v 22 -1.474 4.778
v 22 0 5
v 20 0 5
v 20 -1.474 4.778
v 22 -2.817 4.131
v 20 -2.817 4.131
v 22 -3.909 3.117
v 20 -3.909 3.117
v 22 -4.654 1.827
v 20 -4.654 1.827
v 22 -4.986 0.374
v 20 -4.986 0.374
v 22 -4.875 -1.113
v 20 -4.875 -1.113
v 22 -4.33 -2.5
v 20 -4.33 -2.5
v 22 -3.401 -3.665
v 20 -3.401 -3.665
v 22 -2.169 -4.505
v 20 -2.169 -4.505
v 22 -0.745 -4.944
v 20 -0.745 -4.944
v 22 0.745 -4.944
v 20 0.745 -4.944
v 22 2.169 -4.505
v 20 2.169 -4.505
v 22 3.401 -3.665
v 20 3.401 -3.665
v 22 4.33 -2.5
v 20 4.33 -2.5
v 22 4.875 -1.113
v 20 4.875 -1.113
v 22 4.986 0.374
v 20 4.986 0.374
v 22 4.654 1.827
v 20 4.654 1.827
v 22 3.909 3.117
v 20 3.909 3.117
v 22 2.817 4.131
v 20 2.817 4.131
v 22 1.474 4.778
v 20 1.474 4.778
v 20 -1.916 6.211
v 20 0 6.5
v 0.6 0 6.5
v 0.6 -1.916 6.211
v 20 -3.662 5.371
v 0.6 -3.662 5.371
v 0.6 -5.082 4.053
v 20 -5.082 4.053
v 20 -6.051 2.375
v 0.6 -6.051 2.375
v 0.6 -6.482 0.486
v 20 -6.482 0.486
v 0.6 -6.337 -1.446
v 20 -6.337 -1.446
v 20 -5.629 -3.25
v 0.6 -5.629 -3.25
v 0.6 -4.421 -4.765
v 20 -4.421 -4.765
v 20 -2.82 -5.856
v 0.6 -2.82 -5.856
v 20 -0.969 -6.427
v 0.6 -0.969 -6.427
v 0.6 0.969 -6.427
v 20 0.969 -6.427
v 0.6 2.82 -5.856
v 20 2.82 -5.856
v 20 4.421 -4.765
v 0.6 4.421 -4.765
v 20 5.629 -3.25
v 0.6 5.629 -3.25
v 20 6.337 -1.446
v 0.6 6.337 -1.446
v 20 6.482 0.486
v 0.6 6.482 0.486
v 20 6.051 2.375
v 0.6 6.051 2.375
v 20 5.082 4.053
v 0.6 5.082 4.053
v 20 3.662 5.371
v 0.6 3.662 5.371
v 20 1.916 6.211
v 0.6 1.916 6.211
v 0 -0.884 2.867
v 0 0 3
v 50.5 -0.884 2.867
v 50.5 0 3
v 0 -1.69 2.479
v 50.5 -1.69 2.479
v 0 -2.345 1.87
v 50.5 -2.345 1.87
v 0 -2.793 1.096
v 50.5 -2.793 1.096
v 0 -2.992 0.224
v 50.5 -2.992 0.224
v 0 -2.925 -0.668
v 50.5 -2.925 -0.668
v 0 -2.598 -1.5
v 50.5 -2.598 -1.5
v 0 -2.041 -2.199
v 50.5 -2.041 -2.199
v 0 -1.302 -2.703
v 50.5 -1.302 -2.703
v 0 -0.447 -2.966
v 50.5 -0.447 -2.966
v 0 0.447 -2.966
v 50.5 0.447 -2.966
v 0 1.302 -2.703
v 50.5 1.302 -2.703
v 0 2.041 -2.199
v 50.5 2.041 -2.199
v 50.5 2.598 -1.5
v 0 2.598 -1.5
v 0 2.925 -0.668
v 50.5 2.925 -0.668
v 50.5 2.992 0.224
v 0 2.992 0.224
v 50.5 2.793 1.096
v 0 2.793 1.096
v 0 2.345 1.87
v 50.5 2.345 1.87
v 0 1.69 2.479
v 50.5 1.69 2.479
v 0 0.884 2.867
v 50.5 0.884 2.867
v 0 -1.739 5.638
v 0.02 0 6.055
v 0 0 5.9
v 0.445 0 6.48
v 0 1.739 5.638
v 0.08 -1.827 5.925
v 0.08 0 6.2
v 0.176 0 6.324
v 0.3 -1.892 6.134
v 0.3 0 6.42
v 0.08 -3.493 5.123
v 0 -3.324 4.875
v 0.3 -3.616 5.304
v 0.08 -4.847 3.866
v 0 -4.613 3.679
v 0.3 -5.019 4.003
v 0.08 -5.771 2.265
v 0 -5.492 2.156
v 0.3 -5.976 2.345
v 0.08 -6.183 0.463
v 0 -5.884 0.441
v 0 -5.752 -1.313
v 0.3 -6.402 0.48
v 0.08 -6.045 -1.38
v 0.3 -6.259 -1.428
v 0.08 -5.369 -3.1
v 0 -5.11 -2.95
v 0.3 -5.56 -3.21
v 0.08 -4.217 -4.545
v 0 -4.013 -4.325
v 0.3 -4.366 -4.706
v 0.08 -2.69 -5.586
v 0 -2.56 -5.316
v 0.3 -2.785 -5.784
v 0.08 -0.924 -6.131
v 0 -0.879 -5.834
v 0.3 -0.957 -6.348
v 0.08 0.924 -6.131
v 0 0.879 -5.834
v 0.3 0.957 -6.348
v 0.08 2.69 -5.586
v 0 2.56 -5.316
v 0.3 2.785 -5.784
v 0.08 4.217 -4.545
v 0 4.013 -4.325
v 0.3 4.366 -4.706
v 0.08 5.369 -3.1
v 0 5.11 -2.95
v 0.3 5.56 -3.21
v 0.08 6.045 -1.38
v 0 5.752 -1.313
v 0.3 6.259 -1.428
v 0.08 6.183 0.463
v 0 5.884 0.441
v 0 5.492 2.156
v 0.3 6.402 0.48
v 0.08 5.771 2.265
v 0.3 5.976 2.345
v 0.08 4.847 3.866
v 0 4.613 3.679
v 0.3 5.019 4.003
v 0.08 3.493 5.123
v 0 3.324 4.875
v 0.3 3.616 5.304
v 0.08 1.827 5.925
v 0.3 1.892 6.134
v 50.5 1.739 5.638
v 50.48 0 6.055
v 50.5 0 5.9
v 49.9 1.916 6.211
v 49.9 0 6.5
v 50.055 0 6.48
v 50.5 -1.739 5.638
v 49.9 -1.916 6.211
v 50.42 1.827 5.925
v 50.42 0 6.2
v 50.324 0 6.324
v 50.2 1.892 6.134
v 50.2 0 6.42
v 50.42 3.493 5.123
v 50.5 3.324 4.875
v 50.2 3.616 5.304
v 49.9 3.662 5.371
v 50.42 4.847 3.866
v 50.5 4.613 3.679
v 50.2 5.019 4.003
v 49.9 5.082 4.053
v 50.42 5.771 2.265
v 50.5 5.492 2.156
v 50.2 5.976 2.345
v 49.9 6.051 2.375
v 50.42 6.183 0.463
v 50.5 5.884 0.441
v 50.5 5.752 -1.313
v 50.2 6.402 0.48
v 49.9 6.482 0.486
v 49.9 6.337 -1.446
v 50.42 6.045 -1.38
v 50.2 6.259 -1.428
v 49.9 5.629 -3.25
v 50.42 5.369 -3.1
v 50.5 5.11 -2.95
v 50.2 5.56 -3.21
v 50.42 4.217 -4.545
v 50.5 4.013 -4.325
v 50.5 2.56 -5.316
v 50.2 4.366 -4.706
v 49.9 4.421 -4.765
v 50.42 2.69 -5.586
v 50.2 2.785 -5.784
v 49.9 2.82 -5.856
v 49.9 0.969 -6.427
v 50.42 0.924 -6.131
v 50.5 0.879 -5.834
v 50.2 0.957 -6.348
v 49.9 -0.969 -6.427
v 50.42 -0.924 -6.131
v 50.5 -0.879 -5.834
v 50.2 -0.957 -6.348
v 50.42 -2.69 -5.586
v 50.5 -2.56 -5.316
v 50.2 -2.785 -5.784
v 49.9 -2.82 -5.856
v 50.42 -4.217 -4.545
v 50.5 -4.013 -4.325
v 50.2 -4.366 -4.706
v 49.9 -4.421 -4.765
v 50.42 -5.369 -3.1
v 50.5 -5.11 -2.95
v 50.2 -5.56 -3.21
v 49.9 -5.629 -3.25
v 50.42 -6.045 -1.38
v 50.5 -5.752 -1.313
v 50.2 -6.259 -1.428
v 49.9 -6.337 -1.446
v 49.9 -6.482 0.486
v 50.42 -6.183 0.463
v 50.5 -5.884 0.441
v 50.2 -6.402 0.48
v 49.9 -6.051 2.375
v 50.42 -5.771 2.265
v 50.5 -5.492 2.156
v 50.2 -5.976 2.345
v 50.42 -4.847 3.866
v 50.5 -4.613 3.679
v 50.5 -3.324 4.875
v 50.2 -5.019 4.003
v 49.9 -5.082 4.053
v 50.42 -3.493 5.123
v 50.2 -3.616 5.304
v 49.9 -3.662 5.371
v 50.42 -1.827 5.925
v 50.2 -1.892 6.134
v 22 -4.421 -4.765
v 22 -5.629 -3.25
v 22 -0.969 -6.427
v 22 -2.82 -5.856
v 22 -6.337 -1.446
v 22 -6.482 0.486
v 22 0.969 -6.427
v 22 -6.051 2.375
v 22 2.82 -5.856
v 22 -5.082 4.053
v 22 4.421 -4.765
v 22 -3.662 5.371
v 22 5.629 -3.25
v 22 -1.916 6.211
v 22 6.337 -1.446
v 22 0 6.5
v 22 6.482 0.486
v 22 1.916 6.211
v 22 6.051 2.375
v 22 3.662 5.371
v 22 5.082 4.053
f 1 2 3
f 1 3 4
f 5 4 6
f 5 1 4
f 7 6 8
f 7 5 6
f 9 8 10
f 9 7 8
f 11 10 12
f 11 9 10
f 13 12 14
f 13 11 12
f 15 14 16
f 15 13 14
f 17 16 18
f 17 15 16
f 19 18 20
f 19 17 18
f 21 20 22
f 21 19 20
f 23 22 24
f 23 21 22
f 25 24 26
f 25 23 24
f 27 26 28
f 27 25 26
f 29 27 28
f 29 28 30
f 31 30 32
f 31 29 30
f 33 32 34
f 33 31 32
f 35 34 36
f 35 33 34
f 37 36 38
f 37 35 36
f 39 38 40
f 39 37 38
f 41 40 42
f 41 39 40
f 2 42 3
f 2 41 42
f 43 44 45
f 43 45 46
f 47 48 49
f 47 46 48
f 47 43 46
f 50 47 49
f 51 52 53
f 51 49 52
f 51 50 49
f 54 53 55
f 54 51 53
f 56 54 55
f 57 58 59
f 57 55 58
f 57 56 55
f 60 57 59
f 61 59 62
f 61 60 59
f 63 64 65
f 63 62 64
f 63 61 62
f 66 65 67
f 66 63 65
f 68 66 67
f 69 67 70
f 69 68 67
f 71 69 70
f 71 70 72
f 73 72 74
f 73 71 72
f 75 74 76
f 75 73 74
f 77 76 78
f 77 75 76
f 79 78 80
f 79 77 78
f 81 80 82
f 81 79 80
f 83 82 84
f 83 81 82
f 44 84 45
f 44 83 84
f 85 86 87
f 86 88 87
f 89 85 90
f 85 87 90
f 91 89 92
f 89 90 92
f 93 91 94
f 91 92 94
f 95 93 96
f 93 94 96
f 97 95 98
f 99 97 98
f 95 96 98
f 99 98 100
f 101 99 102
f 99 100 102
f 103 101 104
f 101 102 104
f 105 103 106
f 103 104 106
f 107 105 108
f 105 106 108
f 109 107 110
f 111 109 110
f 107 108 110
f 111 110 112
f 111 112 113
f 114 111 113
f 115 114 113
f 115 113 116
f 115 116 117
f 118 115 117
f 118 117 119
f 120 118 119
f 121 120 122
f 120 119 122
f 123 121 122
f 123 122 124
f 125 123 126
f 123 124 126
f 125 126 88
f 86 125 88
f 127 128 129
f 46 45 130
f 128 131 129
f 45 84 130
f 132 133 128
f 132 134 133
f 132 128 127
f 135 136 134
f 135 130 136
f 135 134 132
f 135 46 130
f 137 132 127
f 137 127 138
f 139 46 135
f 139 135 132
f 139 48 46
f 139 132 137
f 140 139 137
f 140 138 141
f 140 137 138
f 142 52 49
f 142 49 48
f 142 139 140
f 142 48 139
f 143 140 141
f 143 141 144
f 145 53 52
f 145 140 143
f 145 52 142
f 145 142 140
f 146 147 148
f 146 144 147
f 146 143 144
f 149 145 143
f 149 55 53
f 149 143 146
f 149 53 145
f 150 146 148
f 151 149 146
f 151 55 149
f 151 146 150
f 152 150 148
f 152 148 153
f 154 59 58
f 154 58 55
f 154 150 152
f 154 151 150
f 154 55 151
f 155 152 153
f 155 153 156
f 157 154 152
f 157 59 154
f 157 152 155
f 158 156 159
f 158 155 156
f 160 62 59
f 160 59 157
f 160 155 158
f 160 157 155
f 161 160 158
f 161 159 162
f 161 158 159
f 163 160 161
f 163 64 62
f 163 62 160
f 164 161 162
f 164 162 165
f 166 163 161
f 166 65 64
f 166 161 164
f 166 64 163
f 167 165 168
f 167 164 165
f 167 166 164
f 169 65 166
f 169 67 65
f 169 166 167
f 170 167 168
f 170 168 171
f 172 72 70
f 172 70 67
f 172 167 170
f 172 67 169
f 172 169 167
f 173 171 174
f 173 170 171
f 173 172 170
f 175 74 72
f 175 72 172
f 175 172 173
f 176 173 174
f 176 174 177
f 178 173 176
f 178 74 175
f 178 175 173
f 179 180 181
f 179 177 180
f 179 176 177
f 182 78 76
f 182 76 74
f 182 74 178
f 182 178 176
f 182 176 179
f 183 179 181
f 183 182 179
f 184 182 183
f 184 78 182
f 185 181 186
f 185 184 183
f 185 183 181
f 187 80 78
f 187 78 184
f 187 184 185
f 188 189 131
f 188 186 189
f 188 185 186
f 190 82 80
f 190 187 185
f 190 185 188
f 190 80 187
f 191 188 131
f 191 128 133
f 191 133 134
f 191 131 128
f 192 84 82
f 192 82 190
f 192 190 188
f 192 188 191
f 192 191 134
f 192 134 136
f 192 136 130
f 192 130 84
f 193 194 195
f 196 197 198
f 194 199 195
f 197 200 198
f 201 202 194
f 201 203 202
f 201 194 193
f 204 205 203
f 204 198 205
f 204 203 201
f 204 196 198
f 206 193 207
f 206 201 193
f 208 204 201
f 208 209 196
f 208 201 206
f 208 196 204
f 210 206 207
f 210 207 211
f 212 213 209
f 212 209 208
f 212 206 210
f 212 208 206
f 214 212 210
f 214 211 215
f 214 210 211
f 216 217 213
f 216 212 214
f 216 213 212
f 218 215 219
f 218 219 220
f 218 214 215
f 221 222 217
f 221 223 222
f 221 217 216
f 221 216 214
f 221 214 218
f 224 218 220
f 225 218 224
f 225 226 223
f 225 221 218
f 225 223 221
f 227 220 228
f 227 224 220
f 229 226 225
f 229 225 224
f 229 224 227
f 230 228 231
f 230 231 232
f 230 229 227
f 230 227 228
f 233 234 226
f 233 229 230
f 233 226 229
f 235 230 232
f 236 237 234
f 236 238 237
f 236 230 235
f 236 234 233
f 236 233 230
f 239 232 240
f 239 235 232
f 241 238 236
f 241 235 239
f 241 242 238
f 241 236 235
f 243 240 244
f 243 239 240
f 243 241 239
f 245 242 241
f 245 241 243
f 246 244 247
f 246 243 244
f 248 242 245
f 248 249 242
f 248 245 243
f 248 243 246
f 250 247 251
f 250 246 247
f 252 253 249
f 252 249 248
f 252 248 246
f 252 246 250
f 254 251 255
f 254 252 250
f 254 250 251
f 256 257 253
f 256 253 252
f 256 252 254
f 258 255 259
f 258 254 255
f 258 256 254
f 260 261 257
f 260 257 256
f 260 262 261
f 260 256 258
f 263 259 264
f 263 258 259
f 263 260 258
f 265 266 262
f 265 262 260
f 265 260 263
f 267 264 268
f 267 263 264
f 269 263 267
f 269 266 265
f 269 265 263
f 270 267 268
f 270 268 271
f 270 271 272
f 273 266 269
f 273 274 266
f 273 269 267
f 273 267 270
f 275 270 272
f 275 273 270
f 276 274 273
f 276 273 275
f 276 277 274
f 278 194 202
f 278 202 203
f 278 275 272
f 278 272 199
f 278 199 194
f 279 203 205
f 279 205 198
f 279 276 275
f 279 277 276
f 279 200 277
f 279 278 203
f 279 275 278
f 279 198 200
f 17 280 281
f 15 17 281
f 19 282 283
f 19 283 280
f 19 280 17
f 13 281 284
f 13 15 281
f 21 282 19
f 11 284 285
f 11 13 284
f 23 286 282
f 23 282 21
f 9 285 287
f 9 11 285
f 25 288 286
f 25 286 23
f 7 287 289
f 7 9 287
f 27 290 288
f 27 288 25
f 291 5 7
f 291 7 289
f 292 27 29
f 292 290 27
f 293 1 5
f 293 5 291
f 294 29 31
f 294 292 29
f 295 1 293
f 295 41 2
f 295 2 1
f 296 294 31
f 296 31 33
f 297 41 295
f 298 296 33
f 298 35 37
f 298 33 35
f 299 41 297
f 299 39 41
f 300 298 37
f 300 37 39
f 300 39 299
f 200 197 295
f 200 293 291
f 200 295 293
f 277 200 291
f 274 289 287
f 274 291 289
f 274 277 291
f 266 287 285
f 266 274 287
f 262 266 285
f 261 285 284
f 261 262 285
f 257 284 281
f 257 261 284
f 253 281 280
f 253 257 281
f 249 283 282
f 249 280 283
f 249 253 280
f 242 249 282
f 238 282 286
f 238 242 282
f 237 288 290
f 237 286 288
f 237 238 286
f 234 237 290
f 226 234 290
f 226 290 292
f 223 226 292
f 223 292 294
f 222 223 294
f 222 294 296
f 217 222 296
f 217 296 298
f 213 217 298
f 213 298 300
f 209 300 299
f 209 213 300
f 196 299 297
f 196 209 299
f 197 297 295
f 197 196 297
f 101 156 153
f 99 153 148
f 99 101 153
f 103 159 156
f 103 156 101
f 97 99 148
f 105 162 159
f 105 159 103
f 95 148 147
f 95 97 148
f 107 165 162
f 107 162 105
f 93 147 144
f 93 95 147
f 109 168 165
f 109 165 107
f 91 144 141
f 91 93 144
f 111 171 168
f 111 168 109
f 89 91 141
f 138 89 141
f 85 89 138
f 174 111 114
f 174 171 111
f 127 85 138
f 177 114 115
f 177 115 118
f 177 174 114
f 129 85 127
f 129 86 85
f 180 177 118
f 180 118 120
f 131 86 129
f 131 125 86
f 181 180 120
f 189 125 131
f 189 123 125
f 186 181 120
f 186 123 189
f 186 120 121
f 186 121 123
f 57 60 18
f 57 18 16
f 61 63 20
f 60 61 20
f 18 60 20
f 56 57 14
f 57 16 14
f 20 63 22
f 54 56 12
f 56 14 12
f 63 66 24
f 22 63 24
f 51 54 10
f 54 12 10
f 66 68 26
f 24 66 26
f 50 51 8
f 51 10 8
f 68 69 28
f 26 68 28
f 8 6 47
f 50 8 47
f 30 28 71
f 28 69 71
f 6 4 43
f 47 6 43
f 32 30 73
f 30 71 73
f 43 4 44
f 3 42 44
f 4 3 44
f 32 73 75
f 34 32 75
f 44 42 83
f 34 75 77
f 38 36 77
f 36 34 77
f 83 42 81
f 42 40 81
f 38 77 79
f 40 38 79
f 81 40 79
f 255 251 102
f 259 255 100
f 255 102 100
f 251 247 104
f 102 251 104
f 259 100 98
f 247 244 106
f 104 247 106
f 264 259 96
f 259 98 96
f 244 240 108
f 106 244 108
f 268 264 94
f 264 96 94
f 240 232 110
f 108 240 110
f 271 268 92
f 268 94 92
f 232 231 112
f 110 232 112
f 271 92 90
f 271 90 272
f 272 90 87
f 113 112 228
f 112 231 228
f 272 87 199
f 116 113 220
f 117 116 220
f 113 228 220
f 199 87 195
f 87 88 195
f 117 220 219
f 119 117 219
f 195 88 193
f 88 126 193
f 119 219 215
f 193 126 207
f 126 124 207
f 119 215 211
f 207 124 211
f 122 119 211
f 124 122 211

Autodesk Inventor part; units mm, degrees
ref_plane "YZ Plane" through (0, 0, 0) normal (1, 0, 0) x (0, 1, 0)
ref_plane "XZ Plane" through (0, 0, 0) normal (0, 1, 0) x (-1, 0, 0)
ref_plane "XY Plane" through (0, 0, 0) normal (0, 0, 1) x (1, 0, 0)
sketch "Skizze1" plane through (0, 0, 0) normal (0, 1, 0) x (-1, 0, 0)
  line L0 (0, 0) -> (0, 6.5)
  line L1 (0, 6.5) -> (-20, 6.5)
  line L2 (-20, 6.5) -> (-20, 5)
  line L3 (-20, 5) -> (-22, 5)
  line L4 (-22, 5) -> (-22, 6.5)
  line L5 (-22, 6.5) -> (-50.5, 6.5)
  line L6 (-50.5, 6.5) -> (-50.5, 0)
  line L7 (-50.5, 0) -> (0, 0)
  dimension "d0" = 13
  dimension "d1" = 20
  dimension "d2" = 2
  dimension "d3" = 28.5
  dimension "d4" = 10
revolve "Umdrehung1" add sketch "Skizze1" angle 360 about axis through (50.5, 0, 0) along (-1, 0, 0)
sketch "Skizze2" plane through (0, 0, 0) normal (-1, 0, 0) x (0, 0, 1)
  circle A0 centre (0, 0) radius 6.5 projected
  point P0 (0, 0)
hole "Bohrung1" at (0, 0, 0) direction (1, 0, 0) diameter 6 end through all
fillet "Rundung1" radius 0.6 2 edges at (0, 0, -6.5) (50.5, 0, -6.5)
properties part number "204 Welle" material "Aluminum 6061-AHC"
